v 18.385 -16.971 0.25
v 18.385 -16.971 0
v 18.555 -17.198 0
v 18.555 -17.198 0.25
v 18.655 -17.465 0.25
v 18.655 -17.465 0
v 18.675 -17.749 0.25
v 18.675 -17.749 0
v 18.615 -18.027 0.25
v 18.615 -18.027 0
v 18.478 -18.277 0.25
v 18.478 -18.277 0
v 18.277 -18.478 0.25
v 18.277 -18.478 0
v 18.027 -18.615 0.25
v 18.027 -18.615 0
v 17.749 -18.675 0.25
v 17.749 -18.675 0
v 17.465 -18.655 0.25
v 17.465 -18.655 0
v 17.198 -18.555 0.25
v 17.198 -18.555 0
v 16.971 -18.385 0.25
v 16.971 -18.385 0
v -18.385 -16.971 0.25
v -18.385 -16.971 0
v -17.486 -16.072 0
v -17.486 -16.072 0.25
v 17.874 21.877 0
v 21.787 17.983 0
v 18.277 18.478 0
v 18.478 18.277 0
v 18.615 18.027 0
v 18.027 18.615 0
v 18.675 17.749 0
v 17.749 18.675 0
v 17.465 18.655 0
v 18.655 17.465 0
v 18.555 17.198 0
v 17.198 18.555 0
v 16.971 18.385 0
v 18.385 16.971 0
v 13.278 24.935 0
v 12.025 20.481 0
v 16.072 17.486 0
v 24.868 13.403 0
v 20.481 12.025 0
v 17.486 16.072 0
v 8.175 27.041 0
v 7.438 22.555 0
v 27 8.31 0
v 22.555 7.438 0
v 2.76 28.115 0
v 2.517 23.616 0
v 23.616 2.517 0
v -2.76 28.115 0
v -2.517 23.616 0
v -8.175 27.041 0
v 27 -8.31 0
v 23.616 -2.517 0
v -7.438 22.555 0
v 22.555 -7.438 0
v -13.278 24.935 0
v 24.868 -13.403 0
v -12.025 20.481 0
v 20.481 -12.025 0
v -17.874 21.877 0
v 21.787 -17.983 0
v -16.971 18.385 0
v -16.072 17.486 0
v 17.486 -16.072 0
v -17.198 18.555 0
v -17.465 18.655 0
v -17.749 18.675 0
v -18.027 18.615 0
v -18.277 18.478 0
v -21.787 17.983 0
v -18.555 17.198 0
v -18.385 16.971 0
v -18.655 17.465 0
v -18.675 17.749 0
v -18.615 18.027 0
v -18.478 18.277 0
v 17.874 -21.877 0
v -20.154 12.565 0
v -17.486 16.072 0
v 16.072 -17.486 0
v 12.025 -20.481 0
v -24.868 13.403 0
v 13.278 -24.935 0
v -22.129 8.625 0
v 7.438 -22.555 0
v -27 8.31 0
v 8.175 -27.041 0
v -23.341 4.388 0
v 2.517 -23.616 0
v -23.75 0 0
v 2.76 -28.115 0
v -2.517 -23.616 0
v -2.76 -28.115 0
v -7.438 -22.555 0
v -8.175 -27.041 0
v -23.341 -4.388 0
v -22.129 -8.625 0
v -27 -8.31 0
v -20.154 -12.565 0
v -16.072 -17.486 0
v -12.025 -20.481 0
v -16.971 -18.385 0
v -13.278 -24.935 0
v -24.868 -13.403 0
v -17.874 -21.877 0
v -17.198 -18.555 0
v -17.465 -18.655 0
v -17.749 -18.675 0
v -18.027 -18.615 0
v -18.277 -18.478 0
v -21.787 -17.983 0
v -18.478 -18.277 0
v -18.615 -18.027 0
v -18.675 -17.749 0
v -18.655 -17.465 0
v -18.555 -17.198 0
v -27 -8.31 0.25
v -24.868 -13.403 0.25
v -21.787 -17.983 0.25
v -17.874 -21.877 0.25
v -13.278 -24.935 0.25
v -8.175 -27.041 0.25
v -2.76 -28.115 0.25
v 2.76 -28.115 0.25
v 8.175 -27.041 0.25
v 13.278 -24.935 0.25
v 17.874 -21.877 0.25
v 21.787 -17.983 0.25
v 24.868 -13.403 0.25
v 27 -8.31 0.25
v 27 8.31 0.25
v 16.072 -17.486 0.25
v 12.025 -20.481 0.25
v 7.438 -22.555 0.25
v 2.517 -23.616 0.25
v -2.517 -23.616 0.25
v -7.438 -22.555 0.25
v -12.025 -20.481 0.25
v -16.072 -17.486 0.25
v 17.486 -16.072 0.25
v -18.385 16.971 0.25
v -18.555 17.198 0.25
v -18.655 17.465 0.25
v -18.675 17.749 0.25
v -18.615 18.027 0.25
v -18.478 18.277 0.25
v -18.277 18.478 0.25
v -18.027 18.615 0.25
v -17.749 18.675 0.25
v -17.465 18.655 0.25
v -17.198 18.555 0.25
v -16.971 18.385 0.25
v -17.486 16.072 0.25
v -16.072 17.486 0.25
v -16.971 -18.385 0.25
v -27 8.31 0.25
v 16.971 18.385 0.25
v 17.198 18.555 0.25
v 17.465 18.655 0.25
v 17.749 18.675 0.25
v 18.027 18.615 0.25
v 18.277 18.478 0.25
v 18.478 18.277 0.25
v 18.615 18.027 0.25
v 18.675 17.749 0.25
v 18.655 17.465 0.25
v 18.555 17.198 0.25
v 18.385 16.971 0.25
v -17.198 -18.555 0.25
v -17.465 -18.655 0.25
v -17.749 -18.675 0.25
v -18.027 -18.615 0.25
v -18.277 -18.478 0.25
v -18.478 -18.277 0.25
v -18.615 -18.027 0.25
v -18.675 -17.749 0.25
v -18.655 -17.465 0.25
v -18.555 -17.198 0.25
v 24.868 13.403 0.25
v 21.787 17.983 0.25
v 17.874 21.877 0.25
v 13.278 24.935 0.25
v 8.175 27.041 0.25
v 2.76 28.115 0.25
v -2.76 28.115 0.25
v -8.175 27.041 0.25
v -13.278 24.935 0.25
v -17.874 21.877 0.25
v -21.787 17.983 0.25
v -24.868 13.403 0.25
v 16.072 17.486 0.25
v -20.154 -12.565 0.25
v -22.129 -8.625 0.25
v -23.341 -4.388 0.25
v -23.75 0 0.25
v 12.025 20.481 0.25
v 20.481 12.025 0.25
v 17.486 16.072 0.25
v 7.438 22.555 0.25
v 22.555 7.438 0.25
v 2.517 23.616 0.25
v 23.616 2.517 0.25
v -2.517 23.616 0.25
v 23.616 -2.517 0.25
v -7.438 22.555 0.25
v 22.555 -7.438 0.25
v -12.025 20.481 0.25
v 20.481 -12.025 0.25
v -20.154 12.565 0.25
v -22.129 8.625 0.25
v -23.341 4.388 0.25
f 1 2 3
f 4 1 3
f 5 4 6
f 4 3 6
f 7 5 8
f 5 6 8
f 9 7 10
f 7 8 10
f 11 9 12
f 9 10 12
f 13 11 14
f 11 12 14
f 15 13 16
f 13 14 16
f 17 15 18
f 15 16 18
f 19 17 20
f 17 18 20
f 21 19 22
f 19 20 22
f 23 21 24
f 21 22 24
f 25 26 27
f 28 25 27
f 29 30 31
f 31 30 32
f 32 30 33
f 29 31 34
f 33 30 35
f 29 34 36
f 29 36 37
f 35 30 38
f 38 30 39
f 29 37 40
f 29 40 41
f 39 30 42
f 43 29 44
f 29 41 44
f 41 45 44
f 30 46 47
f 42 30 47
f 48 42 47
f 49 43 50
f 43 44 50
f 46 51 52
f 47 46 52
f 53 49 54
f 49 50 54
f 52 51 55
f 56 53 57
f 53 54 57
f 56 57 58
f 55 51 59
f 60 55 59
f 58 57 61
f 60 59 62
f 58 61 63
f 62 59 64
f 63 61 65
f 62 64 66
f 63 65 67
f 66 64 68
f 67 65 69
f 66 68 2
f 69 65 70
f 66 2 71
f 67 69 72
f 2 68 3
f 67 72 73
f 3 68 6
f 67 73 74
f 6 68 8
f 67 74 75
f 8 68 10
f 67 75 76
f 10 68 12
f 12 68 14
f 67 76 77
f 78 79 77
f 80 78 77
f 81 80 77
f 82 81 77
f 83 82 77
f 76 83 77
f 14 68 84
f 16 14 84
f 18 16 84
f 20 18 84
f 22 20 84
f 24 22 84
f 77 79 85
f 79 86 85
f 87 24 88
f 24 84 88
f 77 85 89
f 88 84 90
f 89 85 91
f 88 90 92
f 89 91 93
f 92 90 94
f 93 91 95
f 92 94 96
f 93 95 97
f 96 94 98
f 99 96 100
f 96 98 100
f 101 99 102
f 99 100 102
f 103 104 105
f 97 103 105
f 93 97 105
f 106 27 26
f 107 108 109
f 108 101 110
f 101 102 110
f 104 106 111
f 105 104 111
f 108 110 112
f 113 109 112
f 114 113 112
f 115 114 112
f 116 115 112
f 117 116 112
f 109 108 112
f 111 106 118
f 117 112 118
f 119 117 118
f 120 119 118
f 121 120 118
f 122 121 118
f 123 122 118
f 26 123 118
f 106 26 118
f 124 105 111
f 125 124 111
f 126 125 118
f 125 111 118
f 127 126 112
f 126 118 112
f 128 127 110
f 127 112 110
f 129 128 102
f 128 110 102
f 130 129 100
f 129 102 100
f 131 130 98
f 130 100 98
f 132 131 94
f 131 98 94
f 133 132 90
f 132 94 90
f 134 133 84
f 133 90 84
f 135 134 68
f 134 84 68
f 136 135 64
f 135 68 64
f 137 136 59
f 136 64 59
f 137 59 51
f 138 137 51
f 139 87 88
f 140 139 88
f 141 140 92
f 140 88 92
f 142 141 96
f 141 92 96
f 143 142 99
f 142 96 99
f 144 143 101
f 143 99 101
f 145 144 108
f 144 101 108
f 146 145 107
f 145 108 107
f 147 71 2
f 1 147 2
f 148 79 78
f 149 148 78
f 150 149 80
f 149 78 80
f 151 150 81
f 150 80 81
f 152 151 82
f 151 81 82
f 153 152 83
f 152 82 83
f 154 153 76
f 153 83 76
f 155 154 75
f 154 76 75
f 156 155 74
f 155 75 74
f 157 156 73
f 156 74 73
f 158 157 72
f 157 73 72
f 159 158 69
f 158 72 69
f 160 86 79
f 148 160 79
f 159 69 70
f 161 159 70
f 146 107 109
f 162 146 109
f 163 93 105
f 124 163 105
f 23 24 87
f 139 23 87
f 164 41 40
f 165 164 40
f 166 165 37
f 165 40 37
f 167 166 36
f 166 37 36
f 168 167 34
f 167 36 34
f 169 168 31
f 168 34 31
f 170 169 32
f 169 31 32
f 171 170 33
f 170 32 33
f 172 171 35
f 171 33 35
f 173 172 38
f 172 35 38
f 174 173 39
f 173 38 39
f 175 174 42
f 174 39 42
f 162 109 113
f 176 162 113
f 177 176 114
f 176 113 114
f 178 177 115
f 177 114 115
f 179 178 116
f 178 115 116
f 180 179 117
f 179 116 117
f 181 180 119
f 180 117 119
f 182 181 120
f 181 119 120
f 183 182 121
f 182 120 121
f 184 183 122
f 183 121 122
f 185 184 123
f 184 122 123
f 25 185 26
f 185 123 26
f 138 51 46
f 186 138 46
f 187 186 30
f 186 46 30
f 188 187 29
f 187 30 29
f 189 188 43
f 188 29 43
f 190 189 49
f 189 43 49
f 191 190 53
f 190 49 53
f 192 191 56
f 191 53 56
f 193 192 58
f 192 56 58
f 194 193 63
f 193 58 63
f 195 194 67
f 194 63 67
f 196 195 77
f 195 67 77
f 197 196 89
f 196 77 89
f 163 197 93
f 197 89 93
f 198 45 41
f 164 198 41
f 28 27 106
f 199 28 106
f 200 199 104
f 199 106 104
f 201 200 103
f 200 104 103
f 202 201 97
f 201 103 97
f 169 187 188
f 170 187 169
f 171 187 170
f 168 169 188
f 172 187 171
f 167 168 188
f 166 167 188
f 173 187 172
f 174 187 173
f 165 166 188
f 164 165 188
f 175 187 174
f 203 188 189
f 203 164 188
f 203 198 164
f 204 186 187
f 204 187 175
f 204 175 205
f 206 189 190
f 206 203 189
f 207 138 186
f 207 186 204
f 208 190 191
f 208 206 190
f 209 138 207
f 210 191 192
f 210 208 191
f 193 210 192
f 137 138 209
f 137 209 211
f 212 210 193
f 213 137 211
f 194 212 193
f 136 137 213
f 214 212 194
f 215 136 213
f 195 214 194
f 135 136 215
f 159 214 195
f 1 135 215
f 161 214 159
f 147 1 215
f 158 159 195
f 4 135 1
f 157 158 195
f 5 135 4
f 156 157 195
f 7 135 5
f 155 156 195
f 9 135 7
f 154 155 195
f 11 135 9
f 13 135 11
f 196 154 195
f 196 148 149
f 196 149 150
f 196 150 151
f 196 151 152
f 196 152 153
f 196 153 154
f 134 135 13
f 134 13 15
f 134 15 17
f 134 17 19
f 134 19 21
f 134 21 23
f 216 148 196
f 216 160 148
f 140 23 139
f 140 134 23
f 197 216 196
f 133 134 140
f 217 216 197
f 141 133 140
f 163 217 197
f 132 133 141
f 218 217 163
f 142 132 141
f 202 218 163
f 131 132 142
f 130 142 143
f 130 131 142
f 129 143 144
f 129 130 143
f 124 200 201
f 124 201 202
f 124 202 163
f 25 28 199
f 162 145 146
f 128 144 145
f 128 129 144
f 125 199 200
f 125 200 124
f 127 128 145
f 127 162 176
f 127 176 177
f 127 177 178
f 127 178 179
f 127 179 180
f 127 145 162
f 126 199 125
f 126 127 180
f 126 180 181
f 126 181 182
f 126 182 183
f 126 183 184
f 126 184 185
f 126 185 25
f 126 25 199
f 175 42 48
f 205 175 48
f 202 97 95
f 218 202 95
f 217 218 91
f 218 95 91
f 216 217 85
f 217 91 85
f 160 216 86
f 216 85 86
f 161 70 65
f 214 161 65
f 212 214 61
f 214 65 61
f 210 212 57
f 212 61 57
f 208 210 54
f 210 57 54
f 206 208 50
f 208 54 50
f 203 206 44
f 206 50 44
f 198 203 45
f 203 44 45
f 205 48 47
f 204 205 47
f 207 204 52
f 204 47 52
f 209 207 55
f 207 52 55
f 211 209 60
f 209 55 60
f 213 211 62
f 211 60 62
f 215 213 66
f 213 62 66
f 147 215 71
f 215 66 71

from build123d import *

# Parameters (mm, degrees)
BOSS_EXTRUDE2_DEPTH = 0.25


with BuildPart() as part:
    # Sketch1 → Boss-Extrude2 (new body)
    with BuildSketch(Plane(origin=(0, 0, 0), x_dir=(-1, 0, 0), z_dir=(0, 0, 1))):
        with BuildLine():
            ThreePointArc((27, 8.310385069), (0, 28.25), (-27, 8.310385069))
            Line((-27, 8.310385069), (-27, -8.310385069))
            ThreePointArc((-27, -8.310385069), (0, -28.25), (27, -8.310385069))
            Line((27, -8.310385069), (27, 8.310385069))
        make_face()
        with BuildLine():
            Line((18.384776311, 16.970562748), (17.485999772, 16.07178621))
            ThreePointArc((17.485999772, 16.07178621), (22.128657829, 8.624674064), (23.75, 0))
            ThreePointArc((23.75, 0), (22.128657829, -8.624674064), (17.485999772, -16.07178621))
            Line((17.485999772, -16.07178621), (18.384776311, -16.970562748))
            ThreePointArc((18.384776311, -16.970562748), (18.384776311, -18.384776311), (16.970562748, -18.384776311))
            Line((16.970562748, -18.384776311), (16.07178621, -17.485999772))
            ThreePointArc((16.07178621, -17.485999772), (0, -23.75), (-16.07178621, -17.485999772))
            Line((-16.07178621, -17.485999772), (-16.970562748, -18.384776311))
            ThreePointArc((-16.970562748, -18.384776311), (-18.384776311, -18.384776311), (-18.384776311, -16.970562748))
            Line((-18.384776311, -16.970562748), (-17.485999772, -16.07178621))
            ThreePointArc((-17.485999772, -16.07178621), (-23.75, 0), (-17.485999772, 16.07178621))
            Line((-17.485999772, 16.07178621), (-18.384776311, 16.970562748))
            ThreePointArc((-18.384776311, 16.970562748), (-18.384776311, 18.384776311), (-16.970562748, 18.384776311))
            Line((-16.970562748, 18.384776311), (-16.07178621, 17.485999772))
            ThreePointArc((-16.07178621, 17.485999772), (0, 23.75), (16.07178621, 17.485999772))
            Line((16.07178621, 17.485999772), (16.970562748, 18.384776311))
            ThreePointArc((16.970562748, 18.384776311), (18.384776311, 18.384776311), (18.384776311, 16.970562748))
        make_face(mode=Mode.SUBTRACT)
    extrude(amount=BOSS_EXTRUDE2_DEPTH)


solid = part.part
